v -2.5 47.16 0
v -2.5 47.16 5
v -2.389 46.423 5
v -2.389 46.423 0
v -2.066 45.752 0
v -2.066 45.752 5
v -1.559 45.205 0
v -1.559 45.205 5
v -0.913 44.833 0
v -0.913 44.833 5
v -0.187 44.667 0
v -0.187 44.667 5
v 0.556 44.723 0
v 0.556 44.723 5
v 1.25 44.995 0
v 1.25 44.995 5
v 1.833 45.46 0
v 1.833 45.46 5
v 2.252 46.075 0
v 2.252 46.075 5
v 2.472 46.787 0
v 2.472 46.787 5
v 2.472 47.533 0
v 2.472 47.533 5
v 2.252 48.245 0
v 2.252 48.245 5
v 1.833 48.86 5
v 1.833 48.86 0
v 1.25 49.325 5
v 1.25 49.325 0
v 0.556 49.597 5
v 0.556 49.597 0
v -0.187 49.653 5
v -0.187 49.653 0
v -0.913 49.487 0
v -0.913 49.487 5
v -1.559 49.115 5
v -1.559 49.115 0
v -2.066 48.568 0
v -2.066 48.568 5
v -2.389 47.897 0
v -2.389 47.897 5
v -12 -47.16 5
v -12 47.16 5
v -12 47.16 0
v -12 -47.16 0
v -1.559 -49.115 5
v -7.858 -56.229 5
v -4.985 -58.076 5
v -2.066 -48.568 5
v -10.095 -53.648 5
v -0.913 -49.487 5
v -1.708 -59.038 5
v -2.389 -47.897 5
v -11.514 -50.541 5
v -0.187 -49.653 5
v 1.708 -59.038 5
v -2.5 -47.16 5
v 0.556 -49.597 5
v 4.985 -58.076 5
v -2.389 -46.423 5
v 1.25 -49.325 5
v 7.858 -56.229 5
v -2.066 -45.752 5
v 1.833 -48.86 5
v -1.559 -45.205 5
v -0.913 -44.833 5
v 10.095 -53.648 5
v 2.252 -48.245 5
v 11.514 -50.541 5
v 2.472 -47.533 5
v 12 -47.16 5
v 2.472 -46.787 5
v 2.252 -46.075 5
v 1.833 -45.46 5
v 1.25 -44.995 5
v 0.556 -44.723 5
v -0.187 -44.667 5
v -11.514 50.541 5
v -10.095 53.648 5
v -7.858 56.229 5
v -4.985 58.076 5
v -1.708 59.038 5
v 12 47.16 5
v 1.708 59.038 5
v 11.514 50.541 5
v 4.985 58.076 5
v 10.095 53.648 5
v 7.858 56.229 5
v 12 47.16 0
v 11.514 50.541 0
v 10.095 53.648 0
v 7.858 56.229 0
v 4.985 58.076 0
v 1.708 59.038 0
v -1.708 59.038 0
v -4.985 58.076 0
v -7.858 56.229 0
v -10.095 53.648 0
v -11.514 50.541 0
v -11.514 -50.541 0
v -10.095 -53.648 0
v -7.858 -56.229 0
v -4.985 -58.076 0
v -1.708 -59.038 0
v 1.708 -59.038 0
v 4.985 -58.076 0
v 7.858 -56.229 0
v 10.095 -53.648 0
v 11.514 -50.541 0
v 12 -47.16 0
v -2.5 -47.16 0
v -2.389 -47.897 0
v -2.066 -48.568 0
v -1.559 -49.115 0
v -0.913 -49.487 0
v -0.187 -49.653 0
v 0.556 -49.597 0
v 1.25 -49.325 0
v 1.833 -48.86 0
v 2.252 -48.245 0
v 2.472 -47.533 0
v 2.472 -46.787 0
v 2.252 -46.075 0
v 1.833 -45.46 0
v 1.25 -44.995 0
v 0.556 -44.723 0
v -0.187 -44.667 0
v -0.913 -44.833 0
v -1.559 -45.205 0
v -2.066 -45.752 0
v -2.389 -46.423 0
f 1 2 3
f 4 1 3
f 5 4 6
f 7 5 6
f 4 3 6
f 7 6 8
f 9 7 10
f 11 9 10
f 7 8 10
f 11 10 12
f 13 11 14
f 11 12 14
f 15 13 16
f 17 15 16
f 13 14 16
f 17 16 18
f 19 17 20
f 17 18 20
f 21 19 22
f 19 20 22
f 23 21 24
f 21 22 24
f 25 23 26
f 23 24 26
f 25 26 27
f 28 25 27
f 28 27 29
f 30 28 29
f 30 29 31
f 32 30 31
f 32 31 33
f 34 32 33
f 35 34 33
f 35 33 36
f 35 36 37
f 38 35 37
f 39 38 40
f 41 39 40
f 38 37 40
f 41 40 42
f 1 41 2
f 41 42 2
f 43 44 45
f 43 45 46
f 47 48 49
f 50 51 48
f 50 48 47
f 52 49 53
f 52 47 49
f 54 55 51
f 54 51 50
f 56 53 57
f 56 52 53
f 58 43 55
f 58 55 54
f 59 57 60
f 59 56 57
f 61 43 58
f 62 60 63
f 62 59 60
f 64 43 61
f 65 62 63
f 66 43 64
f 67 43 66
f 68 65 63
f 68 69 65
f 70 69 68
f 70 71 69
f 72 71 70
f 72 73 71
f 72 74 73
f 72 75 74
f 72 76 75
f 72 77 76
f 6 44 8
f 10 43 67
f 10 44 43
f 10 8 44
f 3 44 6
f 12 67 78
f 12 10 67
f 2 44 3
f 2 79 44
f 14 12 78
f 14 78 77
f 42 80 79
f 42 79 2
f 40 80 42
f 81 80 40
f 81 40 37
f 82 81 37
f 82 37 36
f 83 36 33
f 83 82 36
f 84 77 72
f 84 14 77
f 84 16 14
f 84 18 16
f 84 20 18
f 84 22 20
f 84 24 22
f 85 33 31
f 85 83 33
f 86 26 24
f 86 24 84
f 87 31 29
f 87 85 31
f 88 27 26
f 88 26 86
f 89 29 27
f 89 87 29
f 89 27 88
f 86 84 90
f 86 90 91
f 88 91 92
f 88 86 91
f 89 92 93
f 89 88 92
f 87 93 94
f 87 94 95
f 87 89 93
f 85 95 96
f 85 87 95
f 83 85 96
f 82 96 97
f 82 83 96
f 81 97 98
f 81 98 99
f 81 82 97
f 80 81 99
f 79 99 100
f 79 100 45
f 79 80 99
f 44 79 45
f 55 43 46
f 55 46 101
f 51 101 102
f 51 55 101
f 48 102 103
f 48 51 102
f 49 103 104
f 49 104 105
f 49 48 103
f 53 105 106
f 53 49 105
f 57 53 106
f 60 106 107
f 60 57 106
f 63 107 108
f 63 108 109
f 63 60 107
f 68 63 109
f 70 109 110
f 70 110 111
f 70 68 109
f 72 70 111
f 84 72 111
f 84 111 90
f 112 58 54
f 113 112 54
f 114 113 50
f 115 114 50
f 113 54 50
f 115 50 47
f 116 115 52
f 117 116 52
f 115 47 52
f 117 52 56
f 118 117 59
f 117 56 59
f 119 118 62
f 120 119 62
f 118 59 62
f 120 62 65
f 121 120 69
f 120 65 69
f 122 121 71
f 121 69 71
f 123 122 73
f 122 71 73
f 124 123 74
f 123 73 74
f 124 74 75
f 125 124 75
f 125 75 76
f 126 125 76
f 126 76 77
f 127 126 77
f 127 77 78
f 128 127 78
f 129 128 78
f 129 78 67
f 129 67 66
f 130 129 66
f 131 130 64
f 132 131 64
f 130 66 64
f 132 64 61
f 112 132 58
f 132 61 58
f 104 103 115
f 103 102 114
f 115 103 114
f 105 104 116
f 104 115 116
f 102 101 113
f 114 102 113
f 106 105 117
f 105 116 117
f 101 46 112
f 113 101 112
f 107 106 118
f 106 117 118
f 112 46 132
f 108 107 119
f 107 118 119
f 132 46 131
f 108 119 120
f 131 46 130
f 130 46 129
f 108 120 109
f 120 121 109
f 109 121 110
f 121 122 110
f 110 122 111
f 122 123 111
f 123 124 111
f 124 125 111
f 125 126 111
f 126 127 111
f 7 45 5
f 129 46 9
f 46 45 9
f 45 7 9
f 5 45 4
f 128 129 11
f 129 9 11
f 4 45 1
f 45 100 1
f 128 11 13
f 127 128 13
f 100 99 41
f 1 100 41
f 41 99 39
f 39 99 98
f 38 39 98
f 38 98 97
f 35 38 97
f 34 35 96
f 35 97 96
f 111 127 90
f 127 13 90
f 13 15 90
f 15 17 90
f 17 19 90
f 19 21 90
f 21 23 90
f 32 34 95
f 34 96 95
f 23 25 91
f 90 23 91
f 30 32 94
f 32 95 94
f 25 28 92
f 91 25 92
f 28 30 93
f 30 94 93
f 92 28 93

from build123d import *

# Parameters (mm, degrees)
SKETCH_1_R      = 2.5
EXTRUDE_1_DEPTH = 5


with BuildPart() as part:
    # 草图1 → 凸台-拉伸1 (new body)
    with BuildSketch(Plane.XY.offset(5)):
        with BuildLine():
            Line((12, -47.16), (12, 47.16))
            ThreePointArc((12, 47.16), (0, 59.16), (-12, 47.16))
            Line((-12, 47.16), (-12, -47.16))
            ThreePointArc((-12, -47.16), (0, -59.16), (12, -47.16))
        make_face()
        with Locations(Location((0, -47.16, 0), (0, 0, 180))):
            Circle(SKETCH_1_R, mode=Mode.SUBTRACT)
        with Locations(Location((0, 47.16, 0), (0, 0, 180))):
            Circle(SKETCH_1_R, mode=Mode.SUBTRACT)
    extrude(amount=-EXTRUDE_1_DEPTH)


solid = part.part
